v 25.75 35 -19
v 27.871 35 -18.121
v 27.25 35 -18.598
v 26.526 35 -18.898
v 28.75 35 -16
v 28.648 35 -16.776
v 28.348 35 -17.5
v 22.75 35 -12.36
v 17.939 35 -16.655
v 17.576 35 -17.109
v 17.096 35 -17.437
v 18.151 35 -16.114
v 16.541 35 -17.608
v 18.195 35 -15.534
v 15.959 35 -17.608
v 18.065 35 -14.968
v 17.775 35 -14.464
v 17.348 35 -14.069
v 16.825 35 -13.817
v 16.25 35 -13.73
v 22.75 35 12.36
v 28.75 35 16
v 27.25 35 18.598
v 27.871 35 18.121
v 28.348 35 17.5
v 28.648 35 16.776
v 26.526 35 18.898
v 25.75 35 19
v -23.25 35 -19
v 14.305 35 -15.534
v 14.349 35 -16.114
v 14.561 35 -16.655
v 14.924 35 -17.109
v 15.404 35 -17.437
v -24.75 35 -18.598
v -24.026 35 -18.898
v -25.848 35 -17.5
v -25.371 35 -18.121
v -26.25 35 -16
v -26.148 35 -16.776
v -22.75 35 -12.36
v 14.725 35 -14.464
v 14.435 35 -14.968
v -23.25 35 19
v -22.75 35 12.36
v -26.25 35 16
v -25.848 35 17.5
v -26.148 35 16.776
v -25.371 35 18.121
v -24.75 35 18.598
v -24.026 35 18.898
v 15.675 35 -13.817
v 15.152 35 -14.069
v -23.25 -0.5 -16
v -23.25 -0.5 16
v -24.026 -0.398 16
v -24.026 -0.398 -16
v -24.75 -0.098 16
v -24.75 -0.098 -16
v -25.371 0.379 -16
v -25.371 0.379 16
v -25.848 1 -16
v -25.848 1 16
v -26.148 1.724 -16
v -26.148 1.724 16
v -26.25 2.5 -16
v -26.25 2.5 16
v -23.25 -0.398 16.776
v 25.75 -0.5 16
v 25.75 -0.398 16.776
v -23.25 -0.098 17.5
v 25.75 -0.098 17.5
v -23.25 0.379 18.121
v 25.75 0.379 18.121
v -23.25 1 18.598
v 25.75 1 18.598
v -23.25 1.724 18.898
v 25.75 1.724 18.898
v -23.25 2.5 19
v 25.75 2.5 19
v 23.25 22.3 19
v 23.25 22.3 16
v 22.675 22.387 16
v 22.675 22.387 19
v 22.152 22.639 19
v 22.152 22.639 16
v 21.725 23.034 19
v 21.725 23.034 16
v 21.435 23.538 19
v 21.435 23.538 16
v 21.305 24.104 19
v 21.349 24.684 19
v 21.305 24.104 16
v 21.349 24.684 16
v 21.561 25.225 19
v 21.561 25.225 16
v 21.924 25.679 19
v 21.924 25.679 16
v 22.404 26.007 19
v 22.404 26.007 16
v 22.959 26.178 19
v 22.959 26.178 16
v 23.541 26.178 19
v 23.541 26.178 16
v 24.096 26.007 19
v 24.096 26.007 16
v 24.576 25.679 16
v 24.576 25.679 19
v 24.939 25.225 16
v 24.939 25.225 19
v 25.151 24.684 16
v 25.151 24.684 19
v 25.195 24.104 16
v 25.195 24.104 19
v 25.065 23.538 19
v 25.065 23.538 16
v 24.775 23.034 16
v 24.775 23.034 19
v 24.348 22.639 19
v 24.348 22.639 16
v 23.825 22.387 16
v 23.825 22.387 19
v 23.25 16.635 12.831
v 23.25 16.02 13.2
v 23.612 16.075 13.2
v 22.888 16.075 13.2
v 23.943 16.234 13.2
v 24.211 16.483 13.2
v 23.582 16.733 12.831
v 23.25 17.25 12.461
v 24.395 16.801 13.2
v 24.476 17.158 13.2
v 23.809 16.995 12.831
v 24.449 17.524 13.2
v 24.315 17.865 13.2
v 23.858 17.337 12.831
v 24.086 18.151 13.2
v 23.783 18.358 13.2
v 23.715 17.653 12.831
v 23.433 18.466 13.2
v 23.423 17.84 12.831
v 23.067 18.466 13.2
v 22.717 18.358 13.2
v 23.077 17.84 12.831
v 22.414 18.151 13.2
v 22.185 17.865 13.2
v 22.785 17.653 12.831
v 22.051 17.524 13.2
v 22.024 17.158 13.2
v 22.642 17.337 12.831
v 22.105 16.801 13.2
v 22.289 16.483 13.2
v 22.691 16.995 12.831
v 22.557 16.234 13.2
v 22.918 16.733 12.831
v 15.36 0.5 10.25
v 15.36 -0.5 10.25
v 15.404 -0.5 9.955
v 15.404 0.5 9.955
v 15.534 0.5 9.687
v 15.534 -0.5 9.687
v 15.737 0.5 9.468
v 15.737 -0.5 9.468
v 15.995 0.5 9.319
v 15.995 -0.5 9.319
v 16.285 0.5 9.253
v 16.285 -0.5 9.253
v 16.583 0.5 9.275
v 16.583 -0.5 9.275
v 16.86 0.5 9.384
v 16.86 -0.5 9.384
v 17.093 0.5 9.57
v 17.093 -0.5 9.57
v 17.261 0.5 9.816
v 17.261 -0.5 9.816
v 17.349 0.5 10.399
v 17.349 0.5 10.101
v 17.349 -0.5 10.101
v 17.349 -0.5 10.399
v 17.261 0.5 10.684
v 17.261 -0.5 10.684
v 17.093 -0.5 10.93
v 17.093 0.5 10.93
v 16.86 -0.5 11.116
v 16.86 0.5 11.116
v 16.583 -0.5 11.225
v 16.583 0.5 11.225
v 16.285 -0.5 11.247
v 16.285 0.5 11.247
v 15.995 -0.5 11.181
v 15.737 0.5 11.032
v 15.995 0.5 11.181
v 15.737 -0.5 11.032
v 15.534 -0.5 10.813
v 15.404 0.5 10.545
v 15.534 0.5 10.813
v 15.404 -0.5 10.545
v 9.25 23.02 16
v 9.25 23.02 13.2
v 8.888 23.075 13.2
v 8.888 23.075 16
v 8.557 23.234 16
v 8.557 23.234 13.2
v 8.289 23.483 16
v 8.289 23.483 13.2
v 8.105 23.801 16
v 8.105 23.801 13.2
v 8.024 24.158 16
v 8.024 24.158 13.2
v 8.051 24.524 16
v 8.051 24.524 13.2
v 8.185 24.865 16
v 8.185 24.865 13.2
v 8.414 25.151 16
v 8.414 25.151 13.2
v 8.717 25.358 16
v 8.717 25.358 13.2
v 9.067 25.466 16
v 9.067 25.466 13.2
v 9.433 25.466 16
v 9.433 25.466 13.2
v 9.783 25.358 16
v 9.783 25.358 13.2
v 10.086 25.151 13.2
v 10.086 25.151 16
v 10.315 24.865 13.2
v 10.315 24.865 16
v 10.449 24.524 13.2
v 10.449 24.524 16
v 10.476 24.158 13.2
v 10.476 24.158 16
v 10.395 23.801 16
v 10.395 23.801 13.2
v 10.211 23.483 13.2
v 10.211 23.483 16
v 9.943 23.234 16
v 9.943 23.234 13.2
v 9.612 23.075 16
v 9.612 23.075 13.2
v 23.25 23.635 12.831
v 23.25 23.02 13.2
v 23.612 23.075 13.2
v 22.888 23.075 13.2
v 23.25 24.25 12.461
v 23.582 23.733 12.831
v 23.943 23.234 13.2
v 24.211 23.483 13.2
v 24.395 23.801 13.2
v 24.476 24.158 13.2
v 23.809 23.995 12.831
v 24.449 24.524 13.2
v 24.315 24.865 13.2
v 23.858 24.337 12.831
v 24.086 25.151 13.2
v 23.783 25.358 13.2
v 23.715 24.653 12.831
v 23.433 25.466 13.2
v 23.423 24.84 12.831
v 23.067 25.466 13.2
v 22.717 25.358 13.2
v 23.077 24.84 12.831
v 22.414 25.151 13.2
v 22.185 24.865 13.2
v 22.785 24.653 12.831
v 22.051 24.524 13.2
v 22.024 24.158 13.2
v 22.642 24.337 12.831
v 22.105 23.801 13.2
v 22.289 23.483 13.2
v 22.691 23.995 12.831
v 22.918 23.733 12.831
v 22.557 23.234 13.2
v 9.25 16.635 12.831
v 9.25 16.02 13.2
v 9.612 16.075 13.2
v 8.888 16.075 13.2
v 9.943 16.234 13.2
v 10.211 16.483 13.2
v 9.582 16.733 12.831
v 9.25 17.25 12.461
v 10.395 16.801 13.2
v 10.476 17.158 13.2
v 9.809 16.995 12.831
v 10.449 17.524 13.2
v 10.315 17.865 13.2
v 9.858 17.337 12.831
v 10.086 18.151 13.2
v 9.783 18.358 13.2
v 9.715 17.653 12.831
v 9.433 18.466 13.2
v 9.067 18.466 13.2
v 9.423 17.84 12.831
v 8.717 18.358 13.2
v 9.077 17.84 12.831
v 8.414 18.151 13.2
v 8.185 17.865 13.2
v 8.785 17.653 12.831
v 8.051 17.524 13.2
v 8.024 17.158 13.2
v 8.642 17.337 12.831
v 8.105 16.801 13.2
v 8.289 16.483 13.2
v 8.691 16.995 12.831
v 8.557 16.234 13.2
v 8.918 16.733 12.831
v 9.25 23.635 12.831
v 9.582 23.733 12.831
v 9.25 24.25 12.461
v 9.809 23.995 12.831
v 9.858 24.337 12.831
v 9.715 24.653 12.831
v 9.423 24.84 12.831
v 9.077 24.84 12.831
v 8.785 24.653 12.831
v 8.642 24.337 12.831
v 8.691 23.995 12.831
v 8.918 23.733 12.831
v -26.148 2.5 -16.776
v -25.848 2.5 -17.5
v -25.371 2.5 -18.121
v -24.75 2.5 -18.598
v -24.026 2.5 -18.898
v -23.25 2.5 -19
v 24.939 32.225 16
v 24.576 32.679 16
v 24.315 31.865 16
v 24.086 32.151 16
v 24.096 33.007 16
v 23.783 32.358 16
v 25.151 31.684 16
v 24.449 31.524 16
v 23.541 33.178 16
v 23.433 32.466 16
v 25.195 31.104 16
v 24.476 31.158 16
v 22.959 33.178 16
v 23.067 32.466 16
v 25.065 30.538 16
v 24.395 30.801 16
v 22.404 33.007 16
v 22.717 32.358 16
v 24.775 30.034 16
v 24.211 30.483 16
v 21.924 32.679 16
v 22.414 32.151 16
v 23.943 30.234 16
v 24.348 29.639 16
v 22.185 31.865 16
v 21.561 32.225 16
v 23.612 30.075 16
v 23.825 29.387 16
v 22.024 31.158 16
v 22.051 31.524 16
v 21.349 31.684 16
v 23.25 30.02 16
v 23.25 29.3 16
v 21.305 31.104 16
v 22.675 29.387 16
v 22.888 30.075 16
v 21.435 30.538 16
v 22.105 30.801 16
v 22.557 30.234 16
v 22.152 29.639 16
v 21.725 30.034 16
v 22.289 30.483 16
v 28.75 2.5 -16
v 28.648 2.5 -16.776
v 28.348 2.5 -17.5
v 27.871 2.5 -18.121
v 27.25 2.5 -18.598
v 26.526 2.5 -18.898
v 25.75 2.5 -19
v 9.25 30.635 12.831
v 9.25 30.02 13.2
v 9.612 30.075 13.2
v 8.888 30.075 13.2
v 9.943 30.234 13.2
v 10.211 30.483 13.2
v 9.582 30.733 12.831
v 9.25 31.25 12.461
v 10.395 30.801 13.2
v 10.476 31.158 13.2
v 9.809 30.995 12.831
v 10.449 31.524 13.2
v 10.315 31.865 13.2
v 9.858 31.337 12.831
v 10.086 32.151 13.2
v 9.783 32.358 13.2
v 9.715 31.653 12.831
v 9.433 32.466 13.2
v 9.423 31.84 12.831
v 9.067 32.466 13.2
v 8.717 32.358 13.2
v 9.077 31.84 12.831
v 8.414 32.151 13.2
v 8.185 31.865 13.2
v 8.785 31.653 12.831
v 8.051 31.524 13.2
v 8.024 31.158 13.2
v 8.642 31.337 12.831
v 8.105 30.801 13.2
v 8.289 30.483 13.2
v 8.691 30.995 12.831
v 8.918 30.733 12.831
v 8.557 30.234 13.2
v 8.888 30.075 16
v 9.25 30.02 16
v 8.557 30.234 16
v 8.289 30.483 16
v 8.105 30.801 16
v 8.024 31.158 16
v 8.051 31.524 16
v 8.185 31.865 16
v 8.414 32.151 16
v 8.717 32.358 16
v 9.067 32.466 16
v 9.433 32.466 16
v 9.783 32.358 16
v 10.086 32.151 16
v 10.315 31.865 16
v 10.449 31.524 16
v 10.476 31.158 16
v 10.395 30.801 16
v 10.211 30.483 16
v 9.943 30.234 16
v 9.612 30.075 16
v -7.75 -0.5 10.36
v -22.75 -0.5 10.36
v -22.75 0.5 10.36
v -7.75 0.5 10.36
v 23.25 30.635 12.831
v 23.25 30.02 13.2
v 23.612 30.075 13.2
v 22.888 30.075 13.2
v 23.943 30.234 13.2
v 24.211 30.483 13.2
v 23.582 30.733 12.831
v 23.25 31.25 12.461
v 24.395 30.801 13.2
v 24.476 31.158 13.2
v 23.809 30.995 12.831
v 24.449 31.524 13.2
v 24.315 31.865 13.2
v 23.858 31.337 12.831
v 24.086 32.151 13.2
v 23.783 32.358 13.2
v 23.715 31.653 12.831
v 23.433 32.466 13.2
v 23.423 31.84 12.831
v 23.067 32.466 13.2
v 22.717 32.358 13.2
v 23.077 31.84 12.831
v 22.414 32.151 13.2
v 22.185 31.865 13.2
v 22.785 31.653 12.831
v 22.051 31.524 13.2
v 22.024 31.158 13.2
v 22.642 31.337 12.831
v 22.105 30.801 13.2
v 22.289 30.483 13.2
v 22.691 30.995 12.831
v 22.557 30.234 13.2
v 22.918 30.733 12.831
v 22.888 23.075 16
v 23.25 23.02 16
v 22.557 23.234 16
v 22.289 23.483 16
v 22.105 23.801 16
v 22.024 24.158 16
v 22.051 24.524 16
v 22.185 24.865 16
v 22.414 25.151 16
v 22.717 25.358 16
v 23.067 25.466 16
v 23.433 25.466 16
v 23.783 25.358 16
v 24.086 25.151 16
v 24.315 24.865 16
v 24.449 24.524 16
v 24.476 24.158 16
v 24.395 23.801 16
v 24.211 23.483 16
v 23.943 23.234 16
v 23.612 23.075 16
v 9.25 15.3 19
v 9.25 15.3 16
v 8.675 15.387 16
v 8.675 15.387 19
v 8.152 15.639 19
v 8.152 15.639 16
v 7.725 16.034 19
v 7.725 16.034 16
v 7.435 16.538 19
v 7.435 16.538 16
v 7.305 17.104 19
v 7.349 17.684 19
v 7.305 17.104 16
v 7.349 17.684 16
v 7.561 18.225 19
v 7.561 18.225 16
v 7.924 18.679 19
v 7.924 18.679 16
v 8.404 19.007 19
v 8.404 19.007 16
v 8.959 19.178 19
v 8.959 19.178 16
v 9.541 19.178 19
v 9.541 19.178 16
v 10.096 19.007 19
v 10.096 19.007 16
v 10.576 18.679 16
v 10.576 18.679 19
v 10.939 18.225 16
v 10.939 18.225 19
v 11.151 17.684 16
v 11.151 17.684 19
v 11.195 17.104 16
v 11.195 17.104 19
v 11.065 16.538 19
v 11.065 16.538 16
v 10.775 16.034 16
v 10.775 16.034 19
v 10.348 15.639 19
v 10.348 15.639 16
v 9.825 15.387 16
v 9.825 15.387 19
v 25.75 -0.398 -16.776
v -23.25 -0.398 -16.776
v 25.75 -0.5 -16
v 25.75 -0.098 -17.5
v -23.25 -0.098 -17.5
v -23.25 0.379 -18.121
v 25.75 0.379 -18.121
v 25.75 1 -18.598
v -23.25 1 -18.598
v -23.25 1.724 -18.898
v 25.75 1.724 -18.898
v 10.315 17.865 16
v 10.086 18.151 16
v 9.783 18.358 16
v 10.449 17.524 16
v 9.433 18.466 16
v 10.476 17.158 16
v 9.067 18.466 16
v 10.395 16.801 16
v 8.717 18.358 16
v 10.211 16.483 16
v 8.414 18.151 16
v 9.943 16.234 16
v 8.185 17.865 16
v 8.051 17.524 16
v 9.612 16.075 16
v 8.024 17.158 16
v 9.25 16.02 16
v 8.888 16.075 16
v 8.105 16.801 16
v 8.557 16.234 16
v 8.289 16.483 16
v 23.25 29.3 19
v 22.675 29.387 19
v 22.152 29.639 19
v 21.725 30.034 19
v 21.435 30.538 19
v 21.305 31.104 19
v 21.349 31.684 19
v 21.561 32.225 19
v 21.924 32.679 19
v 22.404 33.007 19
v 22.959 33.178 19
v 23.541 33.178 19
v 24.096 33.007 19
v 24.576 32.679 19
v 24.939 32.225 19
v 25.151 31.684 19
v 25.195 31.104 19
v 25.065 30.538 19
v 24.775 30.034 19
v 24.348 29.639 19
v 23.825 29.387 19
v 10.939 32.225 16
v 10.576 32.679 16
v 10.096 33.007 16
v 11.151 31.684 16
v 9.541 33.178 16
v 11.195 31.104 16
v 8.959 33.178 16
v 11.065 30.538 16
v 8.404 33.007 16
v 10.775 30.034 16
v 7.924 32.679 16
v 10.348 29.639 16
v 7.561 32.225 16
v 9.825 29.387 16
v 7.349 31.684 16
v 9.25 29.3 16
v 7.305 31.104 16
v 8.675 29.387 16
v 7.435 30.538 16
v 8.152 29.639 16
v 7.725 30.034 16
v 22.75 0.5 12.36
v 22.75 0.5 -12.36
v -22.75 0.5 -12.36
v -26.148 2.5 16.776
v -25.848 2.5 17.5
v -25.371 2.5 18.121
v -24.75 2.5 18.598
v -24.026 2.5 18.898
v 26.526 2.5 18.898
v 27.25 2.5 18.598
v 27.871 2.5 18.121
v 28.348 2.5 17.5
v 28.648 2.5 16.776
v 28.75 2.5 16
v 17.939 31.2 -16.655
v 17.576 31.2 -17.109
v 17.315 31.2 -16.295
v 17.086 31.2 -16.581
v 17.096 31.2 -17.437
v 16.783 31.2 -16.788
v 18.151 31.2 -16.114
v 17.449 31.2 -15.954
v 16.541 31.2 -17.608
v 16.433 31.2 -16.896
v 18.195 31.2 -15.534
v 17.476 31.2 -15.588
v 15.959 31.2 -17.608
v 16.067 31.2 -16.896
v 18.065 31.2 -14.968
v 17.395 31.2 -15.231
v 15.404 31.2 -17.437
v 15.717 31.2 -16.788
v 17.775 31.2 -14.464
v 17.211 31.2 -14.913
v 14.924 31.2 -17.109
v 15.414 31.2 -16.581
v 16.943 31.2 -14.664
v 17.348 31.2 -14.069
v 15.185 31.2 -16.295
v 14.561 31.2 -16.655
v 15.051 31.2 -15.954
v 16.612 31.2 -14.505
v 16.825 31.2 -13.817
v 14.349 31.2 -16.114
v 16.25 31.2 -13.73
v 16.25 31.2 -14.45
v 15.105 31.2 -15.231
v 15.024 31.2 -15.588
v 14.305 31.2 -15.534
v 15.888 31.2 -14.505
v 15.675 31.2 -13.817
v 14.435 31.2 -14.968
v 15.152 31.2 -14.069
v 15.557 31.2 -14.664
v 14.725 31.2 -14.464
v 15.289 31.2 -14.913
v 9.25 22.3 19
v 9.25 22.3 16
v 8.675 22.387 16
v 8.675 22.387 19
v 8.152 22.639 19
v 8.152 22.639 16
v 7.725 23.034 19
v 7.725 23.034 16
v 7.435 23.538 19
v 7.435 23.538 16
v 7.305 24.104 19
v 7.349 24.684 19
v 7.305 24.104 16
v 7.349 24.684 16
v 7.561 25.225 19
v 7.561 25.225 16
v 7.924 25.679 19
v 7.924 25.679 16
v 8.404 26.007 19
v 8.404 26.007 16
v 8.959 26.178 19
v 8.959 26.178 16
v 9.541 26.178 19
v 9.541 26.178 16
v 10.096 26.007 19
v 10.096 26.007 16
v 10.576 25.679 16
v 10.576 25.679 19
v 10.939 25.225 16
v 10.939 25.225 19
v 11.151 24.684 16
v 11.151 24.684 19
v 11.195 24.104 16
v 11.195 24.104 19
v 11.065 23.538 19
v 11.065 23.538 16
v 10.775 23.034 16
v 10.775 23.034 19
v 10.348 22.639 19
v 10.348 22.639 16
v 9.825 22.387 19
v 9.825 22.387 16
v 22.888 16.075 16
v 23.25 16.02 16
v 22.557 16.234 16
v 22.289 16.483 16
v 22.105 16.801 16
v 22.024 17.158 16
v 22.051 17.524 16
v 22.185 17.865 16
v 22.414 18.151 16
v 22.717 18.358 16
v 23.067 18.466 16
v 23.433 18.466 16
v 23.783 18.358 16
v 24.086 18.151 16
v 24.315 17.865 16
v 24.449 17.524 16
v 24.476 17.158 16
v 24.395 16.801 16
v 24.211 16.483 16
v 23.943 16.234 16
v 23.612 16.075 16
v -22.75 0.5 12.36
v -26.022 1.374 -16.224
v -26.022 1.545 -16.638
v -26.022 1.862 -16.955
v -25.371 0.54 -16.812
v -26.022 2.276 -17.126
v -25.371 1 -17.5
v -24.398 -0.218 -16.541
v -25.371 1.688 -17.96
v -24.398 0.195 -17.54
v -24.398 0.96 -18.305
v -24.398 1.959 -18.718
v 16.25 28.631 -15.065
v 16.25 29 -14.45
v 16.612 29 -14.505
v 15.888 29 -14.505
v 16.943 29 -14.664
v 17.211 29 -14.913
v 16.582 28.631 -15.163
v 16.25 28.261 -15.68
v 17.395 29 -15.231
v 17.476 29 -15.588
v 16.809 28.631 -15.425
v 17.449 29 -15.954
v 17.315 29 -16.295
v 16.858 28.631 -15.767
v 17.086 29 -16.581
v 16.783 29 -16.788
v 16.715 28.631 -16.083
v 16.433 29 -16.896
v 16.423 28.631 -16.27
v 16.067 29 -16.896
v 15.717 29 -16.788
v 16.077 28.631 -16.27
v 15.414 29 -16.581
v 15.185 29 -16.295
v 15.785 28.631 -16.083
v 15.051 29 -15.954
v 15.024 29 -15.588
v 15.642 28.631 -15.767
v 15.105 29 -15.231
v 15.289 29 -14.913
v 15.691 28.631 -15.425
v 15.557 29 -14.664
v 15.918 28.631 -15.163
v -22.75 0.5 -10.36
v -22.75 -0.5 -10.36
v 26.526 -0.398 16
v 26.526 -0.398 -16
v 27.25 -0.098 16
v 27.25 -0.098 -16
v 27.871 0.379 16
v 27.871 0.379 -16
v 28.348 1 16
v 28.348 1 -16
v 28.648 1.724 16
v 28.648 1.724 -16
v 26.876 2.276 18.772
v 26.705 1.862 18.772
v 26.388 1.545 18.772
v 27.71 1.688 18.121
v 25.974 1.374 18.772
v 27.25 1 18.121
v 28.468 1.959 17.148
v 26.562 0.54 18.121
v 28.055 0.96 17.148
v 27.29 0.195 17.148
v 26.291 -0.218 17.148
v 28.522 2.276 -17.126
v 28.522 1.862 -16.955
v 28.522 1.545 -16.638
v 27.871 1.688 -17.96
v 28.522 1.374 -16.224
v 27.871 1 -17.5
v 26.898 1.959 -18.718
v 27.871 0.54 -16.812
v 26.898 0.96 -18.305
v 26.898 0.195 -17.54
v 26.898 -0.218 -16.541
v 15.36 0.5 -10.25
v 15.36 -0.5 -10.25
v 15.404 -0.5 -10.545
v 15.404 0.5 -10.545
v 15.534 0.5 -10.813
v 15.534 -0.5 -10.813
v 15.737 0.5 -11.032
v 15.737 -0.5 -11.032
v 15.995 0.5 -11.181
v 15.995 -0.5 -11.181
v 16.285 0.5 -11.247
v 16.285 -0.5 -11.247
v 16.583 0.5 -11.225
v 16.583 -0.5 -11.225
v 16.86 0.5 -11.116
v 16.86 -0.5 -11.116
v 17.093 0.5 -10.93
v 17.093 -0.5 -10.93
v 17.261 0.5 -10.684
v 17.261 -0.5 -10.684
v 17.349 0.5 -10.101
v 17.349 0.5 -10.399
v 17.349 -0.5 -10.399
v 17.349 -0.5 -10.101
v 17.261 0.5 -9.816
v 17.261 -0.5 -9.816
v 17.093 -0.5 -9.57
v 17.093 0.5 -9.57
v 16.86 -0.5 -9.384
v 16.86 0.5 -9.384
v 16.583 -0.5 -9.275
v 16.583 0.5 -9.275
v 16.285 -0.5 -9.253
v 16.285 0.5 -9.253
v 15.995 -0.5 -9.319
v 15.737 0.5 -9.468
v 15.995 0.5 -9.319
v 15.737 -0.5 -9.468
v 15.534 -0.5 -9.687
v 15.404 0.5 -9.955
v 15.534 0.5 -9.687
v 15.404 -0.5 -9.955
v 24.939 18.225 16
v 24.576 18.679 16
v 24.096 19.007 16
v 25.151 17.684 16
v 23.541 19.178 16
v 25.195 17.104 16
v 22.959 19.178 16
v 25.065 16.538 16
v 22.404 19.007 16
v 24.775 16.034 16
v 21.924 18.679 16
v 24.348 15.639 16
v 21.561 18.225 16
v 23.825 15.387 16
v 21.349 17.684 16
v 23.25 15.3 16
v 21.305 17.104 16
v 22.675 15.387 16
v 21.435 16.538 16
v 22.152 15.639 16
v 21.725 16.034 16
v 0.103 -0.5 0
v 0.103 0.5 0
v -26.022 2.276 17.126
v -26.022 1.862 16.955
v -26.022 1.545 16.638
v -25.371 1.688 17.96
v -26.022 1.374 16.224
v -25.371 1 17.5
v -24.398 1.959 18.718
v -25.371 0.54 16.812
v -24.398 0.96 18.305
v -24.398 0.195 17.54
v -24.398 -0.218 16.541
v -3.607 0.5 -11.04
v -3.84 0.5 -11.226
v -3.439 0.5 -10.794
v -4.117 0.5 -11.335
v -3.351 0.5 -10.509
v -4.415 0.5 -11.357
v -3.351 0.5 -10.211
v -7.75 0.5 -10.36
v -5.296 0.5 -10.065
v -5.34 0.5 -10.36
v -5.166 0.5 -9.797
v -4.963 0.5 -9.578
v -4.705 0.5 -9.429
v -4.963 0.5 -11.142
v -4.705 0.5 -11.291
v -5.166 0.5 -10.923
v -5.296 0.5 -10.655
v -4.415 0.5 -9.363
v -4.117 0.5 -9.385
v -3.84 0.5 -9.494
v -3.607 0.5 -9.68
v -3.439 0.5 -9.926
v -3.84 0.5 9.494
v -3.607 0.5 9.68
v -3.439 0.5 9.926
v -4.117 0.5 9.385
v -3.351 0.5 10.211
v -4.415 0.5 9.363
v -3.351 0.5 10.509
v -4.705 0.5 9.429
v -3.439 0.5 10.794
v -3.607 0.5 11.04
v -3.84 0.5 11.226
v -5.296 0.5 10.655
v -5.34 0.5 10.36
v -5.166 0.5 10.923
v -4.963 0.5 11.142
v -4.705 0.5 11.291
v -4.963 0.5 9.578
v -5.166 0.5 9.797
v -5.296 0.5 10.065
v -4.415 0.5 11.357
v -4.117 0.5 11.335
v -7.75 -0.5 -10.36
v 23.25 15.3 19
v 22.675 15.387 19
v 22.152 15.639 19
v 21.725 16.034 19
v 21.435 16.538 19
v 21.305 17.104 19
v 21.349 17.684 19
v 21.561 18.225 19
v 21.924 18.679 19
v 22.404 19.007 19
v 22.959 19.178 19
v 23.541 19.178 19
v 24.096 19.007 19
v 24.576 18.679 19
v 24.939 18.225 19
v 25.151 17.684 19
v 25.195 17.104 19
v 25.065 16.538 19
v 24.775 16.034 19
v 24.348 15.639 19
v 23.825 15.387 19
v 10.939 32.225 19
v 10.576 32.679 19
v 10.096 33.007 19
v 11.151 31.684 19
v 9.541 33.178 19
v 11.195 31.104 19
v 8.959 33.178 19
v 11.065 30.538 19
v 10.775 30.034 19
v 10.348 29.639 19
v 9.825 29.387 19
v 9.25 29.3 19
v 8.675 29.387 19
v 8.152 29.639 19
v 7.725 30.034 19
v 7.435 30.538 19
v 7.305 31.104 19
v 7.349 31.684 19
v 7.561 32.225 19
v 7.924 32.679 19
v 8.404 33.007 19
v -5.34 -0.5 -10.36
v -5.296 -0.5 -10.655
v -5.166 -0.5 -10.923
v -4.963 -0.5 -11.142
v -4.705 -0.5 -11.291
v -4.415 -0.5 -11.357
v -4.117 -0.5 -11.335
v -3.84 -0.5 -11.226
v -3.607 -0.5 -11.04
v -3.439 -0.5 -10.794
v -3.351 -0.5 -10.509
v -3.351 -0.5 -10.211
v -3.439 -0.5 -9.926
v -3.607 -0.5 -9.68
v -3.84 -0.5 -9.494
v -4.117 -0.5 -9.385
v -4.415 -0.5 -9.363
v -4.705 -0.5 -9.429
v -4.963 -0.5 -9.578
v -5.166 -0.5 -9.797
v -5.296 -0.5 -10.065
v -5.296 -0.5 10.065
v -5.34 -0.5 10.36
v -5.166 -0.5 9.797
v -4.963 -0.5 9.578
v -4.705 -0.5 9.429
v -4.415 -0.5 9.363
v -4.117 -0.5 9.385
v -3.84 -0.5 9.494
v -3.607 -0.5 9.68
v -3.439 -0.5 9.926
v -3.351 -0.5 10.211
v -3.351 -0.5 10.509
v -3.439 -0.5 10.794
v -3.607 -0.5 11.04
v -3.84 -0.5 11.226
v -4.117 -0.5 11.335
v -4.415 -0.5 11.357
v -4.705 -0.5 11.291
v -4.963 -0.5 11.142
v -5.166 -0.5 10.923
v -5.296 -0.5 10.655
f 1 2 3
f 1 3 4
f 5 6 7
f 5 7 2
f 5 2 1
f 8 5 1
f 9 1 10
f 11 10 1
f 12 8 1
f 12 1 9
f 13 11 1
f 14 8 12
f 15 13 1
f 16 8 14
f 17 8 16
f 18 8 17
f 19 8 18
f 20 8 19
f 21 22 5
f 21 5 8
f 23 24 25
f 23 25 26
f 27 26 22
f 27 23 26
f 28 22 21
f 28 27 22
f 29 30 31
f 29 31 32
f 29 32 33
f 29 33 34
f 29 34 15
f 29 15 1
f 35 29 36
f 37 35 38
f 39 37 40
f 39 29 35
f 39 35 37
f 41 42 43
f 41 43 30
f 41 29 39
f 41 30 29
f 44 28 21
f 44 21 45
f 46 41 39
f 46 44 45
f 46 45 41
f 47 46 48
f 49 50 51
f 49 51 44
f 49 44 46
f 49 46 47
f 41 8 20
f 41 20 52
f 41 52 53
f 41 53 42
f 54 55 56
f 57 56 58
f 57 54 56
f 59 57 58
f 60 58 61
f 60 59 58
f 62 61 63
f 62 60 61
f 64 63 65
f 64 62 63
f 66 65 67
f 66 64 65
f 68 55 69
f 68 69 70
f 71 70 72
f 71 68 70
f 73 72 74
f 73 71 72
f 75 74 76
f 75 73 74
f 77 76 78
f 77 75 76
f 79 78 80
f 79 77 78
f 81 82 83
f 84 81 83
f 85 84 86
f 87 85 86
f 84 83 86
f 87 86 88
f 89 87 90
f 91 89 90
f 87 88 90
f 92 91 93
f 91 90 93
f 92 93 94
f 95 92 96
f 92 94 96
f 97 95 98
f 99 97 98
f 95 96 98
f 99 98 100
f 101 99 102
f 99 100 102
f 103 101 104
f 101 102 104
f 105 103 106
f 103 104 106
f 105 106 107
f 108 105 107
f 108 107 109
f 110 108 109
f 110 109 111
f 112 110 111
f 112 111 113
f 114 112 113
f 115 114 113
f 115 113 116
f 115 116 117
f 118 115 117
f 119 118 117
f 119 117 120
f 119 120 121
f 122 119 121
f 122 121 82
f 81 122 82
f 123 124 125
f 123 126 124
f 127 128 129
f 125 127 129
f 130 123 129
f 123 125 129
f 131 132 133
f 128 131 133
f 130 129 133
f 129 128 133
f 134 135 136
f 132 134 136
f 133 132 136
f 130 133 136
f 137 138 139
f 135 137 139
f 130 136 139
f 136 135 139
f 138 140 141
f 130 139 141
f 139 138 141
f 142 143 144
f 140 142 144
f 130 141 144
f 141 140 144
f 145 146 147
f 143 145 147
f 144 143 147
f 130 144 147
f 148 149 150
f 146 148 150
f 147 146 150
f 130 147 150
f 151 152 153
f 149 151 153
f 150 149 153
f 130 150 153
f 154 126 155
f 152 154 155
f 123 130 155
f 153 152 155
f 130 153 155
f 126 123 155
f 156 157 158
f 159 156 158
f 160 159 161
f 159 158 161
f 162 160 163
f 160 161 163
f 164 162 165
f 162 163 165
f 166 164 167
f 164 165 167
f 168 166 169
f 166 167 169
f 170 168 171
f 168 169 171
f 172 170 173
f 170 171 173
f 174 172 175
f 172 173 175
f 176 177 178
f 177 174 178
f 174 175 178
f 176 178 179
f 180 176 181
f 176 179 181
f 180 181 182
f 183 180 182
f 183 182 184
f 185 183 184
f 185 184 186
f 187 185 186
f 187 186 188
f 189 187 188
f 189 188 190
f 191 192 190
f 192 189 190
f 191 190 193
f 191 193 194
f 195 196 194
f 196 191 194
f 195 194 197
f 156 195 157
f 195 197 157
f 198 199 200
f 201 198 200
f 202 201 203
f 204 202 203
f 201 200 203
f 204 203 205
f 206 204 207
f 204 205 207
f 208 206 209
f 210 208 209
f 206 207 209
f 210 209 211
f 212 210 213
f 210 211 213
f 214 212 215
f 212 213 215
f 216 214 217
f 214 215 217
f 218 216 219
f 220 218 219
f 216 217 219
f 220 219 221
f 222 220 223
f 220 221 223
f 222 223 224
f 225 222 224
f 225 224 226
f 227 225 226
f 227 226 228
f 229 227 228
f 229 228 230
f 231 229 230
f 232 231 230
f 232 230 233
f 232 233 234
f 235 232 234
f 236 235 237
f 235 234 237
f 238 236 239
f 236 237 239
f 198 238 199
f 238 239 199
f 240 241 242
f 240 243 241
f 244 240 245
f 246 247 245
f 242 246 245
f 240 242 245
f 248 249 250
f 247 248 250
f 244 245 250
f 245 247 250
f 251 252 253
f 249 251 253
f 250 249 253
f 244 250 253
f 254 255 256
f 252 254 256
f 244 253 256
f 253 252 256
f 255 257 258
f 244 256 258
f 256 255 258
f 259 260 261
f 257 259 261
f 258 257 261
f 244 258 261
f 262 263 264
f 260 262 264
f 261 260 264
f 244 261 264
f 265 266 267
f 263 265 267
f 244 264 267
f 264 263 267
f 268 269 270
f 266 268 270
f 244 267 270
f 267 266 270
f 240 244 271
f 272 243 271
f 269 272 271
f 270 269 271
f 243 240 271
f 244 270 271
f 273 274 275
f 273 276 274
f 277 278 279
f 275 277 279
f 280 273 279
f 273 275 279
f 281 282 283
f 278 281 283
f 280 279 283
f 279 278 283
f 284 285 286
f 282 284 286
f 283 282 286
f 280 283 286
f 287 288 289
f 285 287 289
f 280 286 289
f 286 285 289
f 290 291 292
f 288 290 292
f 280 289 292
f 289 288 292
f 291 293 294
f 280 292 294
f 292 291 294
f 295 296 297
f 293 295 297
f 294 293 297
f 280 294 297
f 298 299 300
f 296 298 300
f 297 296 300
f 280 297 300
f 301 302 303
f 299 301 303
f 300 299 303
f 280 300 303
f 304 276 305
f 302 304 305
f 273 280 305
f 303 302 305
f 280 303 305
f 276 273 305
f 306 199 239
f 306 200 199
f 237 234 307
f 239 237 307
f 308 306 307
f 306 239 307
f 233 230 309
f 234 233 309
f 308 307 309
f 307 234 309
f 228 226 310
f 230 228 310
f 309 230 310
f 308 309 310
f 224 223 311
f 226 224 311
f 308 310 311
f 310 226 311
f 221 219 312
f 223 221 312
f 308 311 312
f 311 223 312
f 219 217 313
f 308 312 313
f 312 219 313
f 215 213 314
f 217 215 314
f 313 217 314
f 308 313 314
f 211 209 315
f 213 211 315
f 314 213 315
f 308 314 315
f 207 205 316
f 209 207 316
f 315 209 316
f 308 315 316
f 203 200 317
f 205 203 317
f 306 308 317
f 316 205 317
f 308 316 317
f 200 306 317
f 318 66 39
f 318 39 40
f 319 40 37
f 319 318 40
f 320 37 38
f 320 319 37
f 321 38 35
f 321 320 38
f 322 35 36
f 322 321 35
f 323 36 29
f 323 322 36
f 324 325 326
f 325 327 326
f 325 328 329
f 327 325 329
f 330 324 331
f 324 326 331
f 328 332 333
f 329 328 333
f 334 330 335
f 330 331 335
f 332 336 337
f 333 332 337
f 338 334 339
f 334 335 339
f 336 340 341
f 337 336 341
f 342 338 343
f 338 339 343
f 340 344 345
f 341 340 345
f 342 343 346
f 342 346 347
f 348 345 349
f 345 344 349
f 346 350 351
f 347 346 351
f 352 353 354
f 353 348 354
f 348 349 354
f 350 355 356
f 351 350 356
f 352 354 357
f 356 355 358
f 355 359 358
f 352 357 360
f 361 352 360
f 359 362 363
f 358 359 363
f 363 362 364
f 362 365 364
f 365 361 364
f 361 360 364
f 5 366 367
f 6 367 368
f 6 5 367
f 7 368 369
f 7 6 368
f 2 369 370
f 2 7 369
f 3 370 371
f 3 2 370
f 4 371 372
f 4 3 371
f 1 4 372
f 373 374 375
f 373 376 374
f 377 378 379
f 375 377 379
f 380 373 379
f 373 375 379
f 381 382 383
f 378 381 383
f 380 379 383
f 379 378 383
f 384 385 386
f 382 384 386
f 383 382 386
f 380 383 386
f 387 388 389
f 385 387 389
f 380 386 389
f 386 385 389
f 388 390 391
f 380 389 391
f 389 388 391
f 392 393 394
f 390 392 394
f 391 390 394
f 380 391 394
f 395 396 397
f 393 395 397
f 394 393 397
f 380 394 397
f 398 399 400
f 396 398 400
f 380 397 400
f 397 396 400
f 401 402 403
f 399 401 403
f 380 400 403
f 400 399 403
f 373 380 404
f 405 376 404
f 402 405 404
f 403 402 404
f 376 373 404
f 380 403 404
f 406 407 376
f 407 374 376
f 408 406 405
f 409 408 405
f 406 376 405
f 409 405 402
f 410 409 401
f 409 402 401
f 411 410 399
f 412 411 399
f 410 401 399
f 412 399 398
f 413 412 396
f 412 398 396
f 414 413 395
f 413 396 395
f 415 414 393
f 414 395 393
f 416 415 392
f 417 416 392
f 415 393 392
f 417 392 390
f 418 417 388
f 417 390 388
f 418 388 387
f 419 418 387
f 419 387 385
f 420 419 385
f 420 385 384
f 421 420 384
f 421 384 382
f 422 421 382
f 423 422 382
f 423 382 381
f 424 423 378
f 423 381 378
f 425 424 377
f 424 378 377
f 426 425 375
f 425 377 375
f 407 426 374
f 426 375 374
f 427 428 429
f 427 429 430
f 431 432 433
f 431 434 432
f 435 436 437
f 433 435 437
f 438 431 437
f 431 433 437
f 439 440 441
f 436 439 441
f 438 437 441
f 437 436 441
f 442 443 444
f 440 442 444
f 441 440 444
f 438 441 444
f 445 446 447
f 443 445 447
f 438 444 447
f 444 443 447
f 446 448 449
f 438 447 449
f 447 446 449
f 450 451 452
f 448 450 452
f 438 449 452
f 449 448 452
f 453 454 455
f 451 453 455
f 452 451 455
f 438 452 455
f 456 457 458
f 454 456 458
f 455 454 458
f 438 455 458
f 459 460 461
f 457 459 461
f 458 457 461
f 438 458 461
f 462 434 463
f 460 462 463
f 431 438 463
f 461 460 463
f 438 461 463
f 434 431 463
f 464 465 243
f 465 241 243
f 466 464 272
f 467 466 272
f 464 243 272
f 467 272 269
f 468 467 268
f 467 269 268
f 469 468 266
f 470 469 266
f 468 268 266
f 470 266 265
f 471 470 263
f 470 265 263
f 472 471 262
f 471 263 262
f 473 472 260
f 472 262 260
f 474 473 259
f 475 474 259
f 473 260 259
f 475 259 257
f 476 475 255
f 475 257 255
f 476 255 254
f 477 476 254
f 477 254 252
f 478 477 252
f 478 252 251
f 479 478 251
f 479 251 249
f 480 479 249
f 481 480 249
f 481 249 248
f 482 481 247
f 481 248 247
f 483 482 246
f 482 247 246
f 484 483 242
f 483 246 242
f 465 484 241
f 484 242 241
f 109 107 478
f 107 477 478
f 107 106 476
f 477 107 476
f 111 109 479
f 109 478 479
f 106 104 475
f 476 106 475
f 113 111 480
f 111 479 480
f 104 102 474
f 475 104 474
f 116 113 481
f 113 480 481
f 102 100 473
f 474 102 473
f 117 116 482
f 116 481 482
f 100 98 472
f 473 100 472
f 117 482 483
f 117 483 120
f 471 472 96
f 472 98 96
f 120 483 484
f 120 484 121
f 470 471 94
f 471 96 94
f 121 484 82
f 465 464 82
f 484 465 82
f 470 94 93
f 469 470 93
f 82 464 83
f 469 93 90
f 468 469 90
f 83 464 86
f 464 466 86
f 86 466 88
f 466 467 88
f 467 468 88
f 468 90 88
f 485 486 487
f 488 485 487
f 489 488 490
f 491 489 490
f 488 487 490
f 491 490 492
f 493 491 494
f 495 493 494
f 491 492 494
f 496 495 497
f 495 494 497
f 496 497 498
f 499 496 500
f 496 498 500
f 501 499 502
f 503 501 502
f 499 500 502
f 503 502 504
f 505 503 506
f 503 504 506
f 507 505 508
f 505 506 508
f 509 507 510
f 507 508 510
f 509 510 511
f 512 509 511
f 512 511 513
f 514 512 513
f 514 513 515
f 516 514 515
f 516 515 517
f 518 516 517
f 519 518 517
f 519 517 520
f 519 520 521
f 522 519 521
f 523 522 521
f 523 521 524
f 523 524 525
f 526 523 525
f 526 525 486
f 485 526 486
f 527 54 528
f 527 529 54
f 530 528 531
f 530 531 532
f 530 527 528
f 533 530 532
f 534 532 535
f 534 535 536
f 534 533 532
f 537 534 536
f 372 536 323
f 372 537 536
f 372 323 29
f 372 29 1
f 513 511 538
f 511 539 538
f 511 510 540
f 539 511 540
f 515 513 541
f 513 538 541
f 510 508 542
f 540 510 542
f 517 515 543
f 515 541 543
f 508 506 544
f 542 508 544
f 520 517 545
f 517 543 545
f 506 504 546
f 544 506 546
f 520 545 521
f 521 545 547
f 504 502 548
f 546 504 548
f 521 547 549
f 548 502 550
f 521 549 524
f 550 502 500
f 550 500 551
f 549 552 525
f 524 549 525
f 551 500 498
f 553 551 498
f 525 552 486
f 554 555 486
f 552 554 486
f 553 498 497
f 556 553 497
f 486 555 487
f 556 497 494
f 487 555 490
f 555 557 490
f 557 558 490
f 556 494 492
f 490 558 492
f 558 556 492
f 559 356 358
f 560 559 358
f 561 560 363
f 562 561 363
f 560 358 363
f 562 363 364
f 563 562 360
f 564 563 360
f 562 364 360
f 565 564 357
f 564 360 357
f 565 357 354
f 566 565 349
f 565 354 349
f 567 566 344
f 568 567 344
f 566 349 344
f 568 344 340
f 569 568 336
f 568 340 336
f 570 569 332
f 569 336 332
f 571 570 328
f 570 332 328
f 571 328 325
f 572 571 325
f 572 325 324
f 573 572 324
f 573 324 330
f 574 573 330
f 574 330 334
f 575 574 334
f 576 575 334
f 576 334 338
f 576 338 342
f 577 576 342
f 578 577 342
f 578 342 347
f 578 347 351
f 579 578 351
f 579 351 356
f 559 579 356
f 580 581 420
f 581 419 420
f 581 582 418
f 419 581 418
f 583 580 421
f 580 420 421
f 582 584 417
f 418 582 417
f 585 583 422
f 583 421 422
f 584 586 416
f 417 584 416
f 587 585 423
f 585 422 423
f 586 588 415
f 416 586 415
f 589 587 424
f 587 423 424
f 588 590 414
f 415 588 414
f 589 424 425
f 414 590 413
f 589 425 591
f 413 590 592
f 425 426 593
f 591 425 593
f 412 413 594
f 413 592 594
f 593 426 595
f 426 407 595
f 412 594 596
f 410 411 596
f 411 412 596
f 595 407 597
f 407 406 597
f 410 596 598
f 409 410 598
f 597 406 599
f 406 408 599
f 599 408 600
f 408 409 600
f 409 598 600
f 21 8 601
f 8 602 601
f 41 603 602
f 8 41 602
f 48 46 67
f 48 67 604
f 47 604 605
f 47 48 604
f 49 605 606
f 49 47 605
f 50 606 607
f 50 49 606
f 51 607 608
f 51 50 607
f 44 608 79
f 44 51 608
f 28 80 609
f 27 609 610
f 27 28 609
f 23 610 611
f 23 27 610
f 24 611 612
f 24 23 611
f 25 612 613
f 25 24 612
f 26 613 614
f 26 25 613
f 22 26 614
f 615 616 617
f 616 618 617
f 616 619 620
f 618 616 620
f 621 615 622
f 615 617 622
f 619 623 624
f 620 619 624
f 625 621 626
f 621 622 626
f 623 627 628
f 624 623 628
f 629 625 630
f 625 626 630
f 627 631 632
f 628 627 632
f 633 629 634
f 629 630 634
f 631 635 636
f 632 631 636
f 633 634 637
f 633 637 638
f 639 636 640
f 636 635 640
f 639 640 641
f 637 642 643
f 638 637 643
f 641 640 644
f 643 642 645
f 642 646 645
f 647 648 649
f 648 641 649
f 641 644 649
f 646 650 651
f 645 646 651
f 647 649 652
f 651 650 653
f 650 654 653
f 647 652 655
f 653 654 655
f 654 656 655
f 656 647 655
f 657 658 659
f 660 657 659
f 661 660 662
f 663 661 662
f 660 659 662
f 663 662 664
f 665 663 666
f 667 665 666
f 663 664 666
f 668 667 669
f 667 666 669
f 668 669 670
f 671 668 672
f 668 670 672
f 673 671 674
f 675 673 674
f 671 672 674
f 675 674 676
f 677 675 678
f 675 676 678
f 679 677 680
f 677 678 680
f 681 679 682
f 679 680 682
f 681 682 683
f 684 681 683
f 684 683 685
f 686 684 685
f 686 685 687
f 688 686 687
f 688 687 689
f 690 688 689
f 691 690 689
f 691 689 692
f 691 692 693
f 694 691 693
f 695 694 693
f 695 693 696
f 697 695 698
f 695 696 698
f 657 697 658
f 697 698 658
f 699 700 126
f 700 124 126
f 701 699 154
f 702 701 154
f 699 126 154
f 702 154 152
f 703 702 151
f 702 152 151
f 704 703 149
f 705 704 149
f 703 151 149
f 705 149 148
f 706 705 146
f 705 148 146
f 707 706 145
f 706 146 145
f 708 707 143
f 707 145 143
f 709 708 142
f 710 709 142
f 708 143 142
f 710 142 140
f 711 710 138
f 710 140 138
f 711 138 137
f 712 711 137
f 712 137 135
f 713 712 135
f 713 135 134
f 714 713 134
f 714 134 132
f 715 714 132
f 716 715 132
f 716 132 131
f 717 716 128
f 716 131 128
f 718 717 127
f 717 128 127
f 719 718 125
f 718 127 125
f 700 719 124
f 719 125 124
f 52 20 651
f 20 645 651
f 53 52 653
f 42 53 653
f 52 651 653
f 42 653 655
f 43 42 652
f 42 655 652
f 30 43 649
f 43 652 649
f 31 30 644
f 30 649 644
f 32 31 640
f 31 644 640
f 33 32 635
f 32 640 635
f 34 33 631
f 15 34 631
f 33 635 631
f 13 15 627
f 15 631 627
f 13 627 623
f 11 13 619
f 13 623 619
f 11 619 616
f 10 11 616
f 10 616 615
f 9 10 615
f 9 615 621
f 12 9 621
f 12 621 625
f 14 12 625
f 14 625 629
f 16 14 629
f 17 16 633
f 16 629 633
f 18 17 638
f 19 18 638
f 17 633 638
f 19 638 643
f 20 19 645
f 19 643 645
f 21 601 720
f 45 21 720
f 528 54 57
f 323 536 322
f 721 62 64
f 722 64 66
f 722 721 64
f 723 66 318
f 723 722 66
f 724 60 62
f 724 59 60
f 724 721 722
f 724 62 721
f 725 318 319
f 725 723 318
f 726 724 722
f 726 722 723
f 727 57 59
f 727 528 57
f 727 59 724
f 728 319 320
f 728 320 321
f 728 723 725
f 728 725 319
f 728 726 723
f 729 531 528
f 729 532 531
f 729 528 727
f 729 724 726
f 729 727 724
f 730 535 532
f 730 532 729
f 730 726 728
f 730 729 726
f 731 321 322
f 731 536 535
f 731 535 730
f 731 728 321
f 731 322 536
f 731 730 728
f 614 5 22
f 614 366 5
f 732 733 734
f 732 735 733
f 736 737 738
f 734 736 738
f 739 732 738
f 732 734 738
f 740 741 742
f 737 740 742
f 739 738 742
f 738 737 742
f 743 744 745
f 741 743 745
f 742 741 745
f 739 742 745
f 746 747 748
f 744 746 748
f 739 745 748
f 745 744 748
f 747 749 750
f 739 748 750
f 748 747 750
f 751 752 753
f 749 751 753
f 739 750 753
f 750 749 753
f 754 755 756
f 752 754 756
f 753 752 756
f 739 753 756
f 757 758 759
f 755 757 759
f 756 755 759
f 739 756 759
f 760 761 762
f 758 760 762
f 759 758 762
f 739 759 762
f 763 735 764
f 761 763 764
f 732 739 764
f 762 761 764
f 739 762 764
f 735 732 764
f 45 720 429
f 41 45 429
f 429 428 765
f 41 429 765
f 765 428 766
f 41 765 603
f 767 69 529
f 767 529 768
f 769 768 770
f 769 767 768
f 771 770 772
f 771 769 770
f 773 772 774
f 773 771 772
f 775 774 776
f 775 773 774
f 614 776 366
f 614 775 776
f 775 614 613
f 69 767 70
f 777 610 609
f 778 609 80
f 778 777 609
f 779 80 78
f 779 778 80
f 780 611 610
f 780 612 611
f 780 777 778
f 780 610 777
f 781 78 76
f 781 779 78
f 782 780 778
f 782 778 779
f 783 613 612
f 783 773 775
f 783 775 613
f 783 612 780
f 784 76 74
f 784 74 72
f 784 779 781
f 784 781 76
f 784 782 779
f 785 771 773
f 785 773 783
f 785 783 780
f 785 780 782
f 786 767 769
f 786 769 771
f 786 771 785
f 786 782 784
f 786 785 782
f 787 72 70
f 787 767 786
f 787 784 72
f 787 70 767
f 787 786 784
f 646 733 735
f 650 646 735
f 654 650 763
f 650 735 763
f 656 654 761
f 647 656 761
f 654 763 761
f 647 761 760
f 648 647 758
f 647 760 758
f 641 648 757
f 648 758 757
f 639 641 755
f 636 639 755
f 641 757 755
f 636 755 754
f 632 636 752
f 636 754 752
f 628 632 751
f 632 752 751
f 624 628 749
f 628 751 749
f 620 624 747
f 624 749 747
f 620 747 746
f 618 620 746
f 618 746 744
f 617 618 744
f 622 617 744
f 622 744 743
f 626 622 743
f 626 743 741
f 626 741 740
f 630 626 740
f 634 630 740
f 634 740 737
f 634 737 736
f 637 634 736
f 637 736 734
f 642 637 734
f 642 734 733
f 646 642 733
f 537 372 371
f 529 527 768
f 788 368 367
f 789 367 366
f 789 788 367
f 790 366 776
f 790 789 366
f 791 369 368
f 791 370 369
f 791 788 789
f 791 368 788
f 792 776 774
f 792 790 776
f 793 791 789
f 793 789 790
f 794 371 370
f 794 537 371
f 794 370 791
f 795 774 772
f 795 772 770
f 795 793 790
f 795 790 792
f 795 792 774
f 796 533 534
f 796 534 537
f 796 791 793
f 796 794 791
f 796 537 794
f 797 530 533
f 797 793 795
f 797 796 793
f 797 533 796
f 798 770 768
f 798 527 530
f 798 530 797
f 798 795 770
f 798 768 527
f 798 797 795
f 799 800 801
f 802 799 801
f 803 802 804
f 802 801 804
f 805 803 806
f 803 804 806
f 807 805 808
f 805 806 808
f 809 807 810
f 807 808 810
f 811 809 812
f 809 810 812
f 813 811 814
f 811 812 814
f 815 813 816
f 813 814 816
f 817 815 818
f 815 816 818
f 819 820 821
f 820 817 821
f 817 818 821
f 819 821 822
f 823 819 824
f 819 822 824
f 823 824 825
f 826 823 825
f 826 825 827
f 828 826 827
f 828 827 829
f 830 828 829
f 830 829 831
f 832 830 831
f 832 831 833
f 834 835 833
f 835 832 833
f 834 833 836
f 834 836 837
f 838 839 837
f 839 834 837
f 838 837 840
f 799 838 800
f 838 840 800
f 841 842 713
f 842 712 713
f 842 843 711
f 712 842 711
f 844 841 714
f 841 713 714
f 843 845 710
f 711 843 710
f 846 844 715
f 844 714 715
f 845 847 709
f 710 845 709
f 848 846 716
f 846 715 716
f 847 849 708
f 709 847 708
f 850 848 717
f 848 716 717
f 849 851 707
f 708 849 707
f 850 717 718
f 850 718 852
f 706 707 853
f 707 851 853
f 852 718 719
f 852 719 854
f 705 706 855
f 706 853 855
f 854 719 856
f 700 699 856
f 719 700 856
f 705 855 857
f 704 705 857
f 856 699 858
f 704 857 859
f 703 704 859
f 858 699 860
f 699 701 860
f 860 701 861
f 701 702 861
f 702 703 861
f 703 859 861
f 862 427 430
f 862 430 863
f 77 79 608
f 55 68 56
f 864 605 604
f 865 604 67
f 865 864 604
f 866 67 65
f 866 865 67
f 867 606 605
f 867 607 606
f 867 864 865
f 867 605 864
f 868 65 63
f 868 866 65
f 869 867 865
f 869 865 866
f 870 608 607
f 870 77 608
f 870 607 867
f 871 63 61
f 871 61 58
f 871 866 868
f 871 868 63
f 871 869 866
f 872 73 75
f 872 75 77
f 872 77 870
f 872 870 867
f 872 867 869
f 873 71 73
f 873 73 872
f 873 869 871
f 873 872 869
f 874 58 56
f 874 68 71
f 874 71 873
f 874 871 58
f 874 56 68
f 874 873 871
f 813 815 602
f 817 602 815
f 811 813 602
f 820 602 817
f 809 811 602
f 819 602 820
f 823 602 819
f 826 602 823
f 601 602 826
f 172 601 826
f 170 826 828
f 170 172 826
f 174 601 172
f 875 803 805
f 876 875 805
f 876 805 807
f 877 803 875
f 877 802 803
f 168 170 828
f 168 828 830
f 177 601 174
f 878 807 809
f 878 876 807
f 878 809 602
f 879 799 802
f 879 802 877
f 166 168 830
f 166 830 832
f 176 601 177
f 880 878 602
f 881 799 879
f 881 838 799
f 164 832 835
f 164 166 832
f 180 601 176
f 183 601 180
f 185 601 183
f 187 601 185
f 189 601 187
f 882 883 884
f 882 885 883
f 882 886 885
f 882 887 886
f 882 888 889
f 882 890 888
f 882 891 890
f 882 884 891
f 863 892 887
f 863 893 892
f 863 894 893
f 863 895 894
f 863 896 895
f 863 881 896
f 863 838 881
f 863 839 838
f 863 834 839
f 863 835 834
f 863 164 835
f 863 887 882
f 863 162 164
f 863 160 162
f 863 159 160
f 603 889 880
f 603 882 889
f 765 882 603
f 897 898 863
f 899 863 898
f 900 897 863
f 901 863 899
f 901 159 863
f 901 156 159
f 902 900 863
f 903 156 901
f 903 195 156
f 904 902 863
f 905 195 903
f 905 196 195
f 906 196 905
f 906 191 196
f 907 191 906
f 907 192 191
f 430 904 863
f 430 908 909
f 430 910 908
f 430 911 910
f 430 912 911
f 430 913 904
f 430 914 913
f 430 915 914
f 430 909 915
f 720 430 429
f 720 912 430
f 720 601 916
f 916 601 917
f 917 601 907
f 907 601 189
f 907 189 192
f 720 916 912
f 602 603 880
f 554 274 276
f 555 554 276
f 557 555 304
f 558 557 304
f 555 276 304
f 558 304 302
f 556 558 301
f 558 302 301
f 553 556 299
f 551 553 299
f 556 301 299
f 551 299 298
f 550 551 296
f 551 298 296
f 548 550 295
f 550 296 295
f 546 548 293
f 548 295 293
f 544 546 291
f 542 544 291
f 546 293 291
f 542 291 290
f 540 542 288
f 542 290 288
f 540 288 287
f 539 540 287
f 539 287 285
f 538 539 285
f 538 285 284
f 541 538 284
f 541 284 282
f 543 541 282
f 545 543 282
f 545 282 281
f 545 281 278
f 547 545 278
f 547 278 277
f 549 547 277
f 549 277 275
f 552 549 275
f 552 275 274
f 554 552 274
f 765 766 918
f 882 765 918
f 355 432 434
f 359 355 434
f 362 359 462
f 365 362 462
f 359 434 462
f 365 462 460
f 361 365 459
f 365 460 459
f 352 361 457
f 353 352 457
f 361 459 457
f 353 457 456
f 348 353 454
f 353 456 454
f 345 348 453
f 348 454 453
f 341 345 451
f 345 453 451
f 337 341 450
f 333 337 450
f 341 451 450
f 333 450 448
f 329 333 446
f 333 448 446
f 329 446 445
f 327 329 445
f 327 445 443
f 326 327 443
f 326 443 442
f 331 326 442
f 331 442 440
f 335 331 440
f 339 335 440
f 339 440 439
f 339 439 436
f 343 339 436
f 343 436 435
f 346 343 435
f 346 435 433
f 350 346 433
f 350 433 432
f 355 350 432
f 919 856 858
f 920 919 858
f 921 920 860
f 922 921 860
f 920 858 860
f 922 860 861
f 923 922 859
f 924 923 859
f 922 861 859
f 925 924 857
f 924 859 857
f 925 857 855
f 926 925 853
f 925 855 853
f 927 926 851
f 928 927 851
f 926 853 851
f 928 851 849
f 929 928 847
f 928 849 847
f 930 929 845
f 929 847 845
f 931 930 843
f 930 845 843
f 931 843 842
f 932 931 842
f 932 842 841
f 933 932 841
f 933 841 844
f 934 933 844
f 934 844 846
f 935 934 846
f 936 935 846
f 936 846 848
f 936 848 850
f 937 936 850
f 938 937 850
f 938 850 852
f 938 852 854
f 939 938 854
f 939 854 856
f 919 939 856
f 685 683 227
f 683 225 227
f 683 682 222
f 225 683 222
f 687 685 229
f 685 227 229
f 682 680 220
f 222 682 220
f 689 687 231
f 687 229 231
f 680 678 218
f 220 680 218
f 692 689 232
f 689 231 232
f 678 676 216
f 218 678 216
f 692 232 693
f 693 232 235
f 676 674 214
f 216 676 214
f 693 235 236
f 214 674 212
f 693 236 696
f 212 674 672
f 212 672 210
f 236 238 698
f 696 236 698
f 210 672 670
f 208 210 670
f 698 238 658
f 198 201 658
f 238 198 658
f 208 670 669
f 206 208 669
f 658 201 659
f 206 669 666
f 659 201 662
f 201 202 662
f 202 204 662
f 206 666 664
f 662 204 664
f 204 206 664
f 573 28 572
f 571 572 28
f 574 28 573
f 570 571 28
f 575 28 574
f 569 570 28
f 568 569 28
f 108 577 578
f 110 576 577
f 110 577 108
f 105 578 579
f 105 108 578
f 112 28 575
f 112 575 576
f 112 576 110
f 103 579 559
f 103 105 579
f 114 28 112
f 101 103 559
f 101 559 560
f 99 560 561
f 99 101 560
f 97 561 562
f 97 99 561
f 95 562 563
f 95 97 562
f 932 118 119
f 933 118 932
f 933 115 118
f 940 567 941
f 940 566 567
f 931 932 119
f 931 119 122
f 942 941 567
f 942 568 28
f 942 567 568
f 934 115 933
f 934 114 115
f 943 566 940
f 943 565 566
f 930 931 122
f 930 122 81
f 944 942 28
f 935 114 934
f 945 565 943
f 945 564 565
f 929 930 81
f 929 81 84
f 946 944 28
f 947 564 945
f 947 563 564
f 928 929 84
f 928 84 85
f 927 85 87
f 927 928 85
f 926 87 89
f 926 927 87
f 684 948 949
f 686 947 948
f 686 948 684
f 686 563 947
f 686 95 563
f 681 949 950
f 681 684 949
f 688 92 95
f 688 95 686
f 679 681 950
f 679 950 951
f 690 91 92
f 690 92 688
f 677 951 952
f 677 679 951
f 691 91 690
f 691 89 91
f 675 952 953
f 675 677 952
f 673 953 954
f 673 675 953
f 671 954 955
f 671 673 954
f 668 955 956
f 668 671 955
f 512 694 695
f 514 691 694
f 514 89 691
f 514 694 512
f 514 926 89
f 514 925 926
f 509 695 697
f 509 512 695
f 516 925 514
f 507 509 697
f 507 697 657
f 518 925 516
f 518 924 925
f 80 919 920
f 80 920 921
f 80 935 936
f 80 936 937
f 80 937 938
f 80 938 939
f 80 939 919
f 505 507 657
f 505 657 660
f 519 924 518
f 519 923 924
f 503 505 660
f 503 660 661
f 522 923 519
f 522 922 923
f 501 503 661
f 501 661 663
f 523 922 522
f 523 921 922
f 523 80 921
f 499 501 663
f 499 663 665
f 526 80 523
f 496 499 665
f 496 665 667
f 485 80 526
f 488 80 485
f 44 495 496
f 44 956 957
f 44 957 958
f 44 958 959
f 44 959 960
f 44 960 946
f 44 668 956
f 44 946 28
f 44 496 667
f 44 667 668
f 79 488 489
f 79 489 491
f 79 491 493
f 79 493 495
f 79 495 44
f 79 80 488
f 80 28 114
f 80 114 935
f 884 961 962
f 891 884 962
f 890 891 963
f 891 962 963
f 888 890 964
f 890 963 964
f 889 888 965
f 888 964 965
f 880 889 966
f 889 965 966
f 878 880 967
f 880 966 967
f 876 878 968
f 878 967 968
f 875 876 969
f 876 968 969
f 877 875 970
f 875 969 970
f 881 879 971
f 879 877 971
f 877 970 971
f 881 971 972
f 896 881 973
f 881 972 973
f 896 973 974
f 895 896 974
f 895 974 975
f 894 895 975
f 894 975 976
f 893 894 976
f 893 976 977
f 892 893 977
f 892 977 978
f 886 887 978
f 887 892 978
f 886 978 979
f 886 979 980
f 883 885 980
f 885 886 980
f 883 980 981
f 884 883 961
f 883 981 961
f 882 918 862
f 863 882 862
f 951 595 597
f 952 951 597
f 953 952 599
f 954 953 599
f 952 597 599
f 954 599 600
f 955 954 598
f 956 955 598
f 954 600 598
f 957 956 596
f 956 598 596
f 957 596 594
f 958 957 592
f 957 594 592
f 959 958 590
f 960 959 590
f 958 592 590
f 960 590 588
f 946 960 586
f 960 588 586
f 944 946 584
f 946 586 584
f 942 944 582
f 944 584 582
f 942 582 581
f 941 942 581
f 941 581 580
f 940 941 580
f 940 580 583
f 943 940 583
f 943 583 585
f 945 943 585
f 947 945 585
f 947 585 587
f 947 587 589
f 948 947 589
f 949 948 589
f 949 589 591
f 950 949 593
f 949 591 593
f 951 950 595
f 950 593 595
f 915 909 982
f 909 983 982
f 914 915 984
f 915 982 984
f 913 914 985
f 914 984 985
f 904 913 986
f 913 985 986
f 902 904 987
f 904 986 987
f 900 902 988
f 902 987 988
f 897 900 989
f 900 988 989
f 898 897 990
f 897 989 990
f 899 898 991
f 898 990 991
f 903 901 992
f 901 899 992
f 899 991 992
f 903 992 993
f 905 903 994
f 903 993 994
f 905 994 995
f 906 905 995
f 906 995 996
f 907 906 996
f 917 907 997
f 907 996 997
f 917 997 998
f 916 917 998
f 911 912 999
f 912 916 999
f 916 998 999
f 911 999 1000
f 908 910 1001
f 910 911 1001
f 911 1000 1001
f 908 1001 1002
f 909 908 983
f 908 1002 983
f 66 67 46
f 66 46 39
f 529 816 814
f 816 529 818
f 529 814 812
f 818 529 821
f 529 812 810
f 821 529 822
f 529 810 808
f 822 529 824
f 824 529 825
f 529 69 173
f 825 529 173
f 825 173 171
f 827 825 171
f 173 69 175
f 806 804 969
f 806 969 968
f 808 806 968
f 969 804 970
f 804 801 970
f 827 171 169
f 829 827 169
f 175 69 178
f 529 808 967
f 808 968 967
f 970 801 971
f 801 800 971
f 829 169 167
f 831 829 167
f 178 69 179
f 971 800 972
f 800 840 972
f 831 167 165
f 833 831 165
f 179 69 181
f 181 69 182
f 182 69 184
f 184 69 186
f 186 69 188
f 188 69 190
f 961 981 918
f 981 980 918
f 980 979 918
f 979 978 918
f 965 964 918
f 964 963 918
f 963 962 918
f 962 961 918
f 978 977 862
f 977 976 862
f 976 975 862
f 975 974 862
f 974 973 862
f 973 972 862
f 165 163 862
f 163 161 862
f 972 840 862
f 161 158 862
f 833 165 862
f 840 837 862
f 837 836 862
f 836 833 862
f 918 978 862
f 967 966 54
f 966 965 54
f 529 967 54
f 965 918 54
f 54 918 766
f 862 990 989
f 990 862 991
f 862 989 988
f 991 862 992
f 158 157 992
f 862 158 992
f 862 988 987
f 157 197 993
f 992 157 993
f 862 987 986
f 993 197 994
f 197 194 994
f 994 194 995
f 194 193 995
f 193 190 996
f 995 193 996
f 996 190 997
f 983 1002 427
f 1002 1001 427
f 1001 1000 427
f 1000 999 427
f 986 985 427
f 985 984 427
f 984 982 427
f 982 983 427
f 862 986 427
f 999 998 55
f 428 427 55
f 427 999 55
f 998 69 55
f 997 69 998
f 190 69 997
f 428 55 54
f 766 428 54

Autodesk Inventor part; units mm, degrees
ref_plane "YZ Plane" through (0, 0, 0) normal (1, 0, 0) x (0, 1, 0)
ref_plane "XZ Plane" through (0, 0, 0) normal (0, 1, 0) x (-1, 0, 0)
ref_plane "XY Plane" through (0, 0, 0) normal (0, 0, 1) x (1, 0, 0)
sketch "Sketch1" plane through (0, 0, 0) normal (0, 1, 0) x (-1, 0, 0)
  line L0 (22.75, -10.36) -> (7.75, -10.36)
  line L1 (7.75, -10.36) -> (-0.1031, 0)
  circle A0 centre (4.34, -10.36) radius 1
  line L2 (22.75, 10.36) -> (7.75, 10.36)
  circle A1 centre (12.64, 0) radius 9.6 construction
  line L3 (22.75, 12.36) -> (22.75, -12.36)
  circle A2 centre (4.34, 10.36) radius 1
  line L4 (7.75, 10.36) -> (-0.1031, 0)
  line L5 (26.25, 19) -> (26.25, -19)
  line L6 (22.75, -12.36) -> (-22.75, -12.36)
  line L7 (22.75, 0) -> (-22.75, 0) construction
  line L8 (26.25, -19) -> (-28.75, -19)
  line L9 (26.25, -19) -> (-28.75, 19) construction
  line L10 (-28.75, -19) -> (26.25, 19) construction
  line L11 (-22.75, 12.36) -> (22.75, 12.36)
  line L12 (-28.75, 19) -> (26.25, 19)
  line L13 (-28.75, -19) -> (-28.75, 19)
  circle A3 centre (-16.36, 10.25) radius 1
  line L14 (-22.75, -12.36) -> (-22.75, 12.36)
  circle A4 centre (-16.36, -10.25) radius 1
  point P0 (0, 0)
  point P1 (-1.25, 0)
  point P2 (0, 0)
  point P3 (22.75, -10.36)
  dimension "d0" = 55
  dimension "d1" = 38
  dimension "d2" = 45.5
  dimension "d3" = 24.72
  dimension "d4" = 2
  dimension "d6" = 18.41
  dimension "d7" = 20.5
  dimension "d8" = 19.2
  dimension "d9" = 10.11
  dimension "d10" = 13
  dimension "d11" = 15
  dimension "d12" = 3.5
  dimension "d13" = 2
  dimension "d14" = 3.41
  dimension "d51" = 20.7
extrude "Extrusion1" add sketch "Sketch1" along normal mid plane 1 contours L3 L6 L14 L11 L2 L4 L1 L0 | L5 L8 L13 L12
extrude "Extrusion2" add sketch "Sketch1" along normal blind 35 contours L5 L8 L13 L12
fillet "Fillet1" radius 3 8 edges at (1.25, -0.5, -19) (28.75, -0.5, 0) (1.25, -0.5, 19) (-26.25, -0.5, 0) (28.75, 17.25, -19) (28.75, 17.25, 19) (-26.25, 17.25, 19) (-26.25, 17.25, -19)
sketch "Sketch3" plane through (-23.25, 35, 19) normal (0, 0, 1) x (1, 0, 0)
  line L0 (46.5, -34.5) -> (46.5, 0)
  circle A0 centre (46.5, -17.75) radius 1.5
  circle A1 centre (46.5, -10.75) radius 1.5
  circle A2 centre (46.5, -3.75) radius 1.5
  circle A3 centre (32.5, -17.75) radius 1.5
  circle A4 centre (32.5, -10.75) radius 1.5
  circle A5 centre (32.5, -3.75) radius 1.5
  line L1 (52, -32.5) -> (52, 0) projected
  line L2 (0, 0) -> (49, 0) projected
  dimension "d23" = 7
  dimension "d26" = 14
  dimension "d52" = 5.5
  dimension "d53" = 3.75
hole "Hole1" at (23.25, 17.25, 19) at (9.25, 17.25, 19) at (9.25, 24.25, 19) at (23.25, 24.25, 19) at (23.25, 31.25, 19) at (9.25, 31.25, 19) direction (0, 0, -1) diameter 2.459 depth 5.8 tip angle 118 counterbore diameter 3.9 counterbore depth 3 thread size "M3x0.5" class "6H" standard "ISO Metric profile"
sketch "Sketch6" plane through (0, 35, 0) normal (0, 1, 0) x (1, 0, 0)
  line L0 (25.75, 19) -> (-23.25, 19) projected
  line L1 (28.75, -16) -> (28.75, 16) projected
  point P0 (0, 0)
  point P1 (16.25, 15.68)
  dimension "d64" = 3.32
  dimension "d65" = 12.5
hole "Hole2" at (16.25, 35, -15.68) direction (0, -1, 0) diameter 2.459 depth 6 tip angle 118 counterbore diameter 3.9 counterbore depth 3.8 thread size "M3x0.5" class "6H" standard "ISO Metric profile"
properties part number "basket" material "PCTG 20%"
